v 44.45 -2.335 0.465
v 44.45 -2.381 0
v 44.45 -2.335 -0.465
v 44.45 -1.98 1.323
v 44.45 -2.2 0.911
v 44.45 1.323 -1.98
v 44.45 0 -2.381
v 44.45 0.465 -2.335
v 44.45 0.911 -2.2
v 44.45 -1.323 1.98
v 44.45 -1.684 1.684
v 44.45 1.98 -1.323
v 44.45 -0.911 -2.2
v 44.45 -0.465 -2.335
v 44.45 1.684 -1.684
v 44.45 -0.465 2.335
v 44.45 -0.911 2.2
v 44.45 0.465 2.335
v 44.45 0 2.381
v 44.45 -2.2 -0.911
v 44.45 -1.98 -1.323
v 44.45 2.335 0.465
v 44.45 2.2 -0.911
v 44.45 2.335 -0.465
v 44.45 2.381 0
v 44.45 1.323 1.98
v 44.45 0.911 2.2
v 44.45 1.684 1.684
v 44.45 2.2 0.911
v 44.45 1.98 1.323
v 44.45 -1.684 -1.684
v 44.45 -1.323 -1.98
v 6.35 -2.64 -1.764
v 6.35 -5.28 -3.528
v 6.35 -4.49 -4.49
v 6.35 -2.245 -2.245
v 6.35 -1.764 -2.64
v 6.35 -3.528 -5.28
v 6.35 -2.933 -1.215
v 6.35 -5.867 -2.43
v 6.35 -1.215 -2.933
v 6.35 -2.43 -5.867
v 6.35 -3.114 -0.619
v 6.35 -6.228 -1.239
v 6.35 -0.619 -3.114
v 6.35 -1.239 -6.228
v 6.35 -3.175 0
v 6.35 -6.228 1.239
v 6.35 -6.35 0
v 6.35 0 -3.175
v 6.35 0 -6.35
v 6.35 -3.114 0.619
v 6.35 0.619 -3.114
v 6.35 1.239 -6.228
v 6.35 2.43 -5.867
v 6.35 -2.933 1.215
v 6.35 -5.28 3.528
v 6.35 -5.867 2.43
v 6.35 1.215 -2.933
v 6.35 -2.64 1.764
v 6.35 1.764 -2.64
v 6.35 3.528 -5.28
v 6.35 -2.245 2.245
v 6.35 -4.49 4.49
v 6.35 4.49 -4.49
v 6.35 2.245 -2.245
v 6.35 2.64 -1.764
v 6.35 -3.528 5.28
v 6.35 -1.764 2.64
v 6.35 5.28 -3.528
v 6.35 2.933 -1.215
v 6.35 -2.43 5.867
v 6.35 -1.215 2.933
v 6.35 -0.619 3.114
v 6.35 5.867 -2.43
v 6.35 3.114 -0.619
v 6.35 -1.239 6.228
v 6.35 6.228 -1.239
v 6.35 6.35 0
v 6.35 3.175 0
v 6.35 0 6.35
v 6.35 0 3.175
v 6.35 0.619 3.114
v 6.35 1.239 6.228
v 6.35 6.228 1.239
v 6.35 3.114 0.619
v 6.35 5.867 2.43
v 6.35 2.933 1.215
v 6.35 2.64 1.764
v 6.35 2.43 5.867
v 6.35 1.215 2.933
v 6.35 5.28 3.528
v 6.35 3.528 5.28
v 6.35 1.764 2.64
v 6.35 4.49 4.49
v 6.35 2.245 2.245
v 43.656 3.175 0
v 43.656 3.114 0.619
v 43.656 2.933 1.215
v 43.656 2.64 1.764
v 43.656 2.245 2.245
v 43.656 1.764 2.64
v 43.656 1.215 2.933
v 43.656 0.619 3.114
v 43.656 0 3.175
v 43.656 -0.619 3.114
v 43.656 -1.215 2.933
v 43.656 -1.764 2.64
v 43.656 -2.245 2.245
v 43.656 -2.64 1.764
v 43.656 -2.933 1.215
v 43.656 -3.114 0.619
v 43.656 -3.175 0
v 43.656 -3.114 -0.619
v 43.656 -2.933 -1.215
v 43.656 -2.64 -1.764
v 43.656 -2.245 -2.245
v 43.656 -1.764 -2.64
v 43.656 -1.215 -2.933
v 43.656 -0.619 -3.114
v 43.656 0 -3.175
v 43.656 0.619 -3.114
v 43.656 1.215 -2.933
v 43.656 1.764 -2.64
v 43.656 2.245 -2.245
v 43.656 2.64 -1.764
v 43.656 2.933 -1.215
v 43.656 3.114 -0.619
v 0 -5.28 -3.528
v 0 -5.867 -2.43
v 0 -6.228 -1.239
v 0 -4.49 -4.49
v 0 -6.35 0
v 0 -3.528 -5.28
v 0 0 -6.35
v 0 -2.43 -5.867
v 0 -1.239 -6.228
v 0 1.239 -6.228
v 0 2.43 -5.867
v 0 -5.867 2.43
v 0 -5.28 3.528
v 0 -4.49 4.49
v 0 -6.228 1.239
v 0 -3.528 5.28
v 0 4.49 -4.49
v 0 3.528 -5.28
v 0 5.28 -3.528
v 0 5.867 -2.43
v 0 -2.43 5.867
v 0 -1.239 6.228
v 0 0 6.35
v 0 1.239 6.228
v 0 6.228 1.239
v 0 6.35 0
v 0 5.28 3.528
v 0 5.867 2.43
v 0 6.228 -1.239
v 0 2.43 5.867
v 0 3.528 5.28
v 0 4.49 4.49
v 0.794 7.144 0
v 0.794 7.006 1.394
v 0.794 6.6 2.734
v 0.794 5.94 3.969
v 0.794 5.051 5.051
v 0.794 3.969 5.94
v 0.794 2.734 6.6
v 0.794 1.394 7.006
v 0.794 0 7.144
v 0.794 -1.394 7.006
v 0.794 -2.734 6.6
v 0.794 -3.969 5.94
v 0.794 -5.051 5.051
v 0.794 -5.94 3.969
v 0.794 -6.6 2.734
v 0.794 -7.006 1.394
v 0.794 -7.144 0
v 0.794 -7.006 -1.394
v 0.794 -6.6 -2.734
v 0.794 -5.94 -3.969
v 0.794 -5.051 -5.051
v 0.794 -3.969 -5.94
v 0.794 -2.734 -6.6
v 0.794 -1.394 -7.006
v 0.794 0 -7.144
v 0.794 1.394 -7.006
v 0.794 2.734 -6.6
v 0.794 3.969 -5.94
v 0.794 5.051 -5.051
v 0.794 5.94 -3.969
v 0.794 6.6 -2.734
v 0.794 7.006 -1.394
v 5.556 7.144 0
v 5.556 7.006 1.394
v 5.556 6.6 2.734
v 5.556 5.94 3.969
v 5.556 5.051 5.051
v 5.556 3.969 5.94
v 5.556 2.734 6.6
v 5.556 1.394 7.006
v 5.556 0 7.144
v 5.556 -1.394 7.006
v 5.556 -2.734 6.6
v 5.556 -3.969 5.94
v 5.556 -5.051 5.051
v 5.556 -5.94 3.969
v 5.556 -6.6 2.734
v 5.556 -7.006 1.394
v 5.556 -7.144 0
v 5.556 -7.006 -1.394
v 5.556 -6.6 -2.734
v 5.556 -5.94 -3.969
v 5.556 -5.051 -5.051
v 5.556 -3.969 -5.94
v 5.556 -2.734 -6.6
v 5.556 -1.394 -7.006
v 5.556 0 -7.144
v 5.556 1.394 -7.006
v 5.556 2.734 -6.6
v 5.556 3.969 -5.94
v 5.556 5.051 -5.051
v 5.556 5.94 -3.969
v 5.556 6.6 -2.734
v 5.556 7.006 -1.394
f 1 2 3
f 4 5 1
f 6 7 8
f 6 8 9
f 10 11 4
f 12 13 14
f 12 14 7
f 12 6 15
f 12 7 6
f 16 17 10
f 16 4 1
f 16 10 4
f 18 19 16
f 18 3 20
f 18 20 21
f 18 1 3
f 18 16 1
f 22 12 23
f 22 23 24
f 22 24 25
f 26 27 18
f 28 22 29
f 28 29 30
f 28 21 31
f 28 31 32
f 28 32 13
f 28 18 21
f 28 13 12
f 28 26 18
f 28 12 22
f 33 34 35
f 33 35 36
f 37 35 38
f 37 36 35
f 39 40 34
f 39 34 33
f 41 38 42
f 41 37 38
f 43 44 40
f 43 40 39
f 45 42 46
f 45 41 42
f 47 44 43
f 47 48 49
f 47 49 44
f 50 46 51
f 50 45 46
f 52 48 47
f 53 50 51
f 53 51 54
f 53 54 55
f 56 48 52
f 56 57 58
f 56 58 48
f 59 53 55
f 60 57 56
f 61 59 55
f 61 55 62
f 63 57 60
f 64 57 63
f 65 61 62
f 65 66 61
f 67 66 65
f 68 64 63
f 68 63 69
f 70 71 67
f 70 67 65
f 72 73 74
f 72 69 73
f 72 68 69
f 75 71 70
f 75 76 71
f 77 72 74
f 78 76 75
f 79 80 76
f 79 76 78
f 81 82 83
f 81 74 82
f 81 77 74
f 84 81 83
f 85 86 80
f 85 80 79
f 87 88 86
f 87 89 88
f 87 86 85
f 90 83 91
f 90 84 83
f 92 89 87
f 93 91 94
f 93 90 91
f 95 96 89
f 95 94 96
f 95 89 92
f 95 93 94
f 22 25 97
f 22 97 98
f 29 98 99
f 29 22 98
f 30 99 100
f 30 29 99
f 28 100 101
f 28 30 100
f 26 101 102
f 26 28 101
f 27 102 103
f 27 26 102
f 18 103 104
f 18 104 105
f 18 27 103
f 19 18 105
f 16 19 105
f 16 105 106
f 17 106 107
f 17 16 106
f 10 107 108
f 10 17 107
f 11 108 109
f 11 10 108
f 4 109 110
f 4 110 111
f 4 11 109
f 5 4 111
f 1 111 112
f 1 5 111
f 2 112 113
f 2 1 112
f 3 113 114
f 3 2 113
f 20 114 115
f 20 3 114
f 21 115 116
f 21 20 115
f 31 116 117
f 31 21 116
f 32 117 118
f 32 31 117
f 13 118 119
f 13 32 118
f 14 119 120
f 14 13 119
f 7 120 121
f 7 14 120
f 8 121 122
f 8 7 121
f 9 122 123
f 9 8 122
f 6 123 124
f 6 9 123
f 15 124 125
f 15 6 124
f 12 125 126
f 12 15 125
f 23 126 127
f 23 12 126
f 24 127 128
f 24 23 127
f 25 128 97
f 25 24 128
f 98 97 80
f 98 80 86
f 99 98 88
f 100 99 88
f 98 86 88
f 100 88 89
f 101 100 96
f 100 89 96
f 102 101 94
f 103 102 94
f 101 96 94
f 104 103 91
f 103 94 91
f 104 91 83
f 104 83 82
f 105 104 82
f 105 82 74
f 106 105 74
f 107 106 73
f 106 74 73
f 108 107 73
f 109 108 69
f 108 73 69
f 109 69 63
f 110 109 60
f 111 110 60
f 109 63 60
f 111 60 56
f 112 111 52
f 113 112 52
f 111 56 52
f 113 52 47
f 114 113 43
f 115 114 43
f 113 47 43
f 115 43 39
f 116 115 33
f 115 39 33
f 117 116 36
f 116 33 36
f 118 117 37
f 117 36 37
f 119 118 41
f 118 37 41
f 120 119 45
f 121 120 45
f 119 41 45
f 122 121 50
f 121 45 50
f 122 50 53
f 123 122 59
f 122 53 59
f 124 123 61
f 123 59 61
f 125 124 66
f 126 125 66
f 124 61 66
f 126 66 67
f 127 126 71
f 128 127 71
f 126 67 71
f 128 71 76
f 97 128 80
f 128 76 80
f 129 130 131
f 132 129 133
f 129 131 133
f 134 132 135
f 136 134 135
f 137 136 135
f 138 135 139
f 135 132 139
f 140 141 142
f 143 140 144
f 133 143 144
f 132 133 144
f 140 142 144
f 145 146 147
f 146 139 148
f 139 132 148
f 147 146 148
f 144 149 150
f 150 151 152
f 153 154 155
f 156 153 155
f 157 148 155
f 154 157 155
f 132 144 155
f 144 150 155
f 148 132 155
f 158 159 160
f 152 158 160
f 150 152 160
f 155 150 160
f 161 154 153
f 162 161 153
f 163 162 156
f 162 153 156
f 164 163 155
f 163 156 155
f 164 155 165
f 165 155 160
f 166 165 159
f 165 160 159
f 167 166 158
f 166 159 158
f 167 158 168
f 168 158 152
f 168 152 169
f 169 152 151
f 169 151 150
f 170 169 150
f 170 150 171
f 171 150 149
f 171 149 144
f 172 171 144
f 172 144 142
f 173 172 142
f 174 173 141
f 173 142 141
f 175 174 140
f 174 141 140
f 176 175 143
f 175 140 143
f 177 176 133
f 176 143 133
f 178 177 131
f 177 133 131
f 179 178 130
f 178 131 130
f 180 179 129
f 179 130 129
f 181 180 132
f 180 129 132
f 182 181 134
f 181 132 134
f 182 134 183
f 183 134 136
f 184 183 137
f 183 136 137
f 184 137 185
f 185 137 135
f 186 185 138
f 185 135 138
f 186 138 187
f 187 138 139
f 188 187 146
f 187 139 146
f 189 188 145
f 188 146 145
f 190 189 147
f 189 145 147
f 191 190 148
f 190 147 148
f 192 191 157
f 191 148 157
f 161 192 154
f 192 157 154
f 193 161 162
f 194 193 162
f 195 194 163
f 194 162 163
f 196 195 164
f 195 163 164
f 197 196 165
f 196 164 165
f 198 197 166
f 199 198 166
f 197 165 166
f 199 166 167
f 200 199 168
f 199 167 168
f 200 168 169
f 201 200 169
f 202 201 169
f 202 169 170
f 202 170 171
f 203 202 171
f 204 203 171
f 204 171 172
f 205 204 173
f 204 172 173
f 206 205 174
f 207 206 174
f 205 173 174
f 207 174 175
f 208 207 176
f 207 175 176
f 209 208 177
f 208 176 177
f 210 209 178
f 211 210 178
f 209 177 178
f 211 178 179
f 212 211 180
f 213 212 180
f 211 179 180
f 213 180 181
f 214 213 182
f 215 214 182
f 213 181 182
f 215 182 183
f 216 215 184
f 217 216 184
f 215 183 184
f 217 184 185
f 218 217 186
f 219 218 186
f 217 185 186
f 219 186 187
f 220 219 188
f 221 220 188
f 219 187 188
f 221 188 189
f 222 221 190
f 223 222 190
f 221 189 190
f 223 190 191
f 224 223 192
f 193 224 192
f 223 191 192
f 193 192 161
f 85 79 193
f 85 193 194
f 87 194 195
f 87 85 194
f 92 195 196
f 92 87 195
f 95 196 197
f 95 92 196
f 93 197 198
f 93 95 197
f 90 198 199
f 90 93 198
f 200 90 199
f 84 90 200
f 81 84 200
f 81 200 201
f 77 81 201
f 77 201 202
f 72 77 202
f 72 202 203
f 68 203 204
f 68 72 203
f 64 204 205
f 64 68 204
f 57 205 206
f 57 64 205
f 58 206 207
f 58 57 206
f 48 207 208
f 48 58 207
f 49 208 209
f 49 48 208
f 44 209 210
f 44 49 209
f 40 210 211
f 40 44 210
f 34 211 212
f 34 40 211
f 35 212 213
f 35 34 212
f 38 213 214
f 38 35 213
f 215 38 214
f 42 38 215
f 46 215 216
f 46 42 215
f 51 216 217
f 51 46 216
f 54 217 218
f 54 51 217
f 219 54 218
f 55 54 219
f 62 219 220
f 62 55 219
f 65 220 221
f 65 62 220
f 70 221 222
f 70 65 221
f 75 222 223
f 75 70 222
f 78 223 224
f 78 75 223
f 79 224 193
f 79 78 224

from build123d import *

# Parameters (mm, degrees)
F0_R     = 7.14375
F1_DEPTH = 6.35
F2_R     = 3.175
F3_DEPTH = 38.1
F4_SIZE  = 0.79375


with BuildPart() as f1:
    # F0 (on Right) → F1 (new body)
    with BuildSketch(Plane.YZ):
        Circle(F0_R)
    extrude(amount=F1_DEPTH)

    # F2 (on face) → F3 (join)
    with BuildSketch(Plane.YZ.offset(6.35)):
        Circle(F2_R)
    extrude(amount=F3_DEPTH)

    # F4
    f4_edges = [f1.edges().sort_by_distance(p)[0] for p in [
        (6.35, -7.14375, 0),
        (0, -7.14375, 0),
        (44.45, -3.175, 0),
    ]]
    chamfer(f4_edges, length=F4_SIZE)


solid = f1.part
